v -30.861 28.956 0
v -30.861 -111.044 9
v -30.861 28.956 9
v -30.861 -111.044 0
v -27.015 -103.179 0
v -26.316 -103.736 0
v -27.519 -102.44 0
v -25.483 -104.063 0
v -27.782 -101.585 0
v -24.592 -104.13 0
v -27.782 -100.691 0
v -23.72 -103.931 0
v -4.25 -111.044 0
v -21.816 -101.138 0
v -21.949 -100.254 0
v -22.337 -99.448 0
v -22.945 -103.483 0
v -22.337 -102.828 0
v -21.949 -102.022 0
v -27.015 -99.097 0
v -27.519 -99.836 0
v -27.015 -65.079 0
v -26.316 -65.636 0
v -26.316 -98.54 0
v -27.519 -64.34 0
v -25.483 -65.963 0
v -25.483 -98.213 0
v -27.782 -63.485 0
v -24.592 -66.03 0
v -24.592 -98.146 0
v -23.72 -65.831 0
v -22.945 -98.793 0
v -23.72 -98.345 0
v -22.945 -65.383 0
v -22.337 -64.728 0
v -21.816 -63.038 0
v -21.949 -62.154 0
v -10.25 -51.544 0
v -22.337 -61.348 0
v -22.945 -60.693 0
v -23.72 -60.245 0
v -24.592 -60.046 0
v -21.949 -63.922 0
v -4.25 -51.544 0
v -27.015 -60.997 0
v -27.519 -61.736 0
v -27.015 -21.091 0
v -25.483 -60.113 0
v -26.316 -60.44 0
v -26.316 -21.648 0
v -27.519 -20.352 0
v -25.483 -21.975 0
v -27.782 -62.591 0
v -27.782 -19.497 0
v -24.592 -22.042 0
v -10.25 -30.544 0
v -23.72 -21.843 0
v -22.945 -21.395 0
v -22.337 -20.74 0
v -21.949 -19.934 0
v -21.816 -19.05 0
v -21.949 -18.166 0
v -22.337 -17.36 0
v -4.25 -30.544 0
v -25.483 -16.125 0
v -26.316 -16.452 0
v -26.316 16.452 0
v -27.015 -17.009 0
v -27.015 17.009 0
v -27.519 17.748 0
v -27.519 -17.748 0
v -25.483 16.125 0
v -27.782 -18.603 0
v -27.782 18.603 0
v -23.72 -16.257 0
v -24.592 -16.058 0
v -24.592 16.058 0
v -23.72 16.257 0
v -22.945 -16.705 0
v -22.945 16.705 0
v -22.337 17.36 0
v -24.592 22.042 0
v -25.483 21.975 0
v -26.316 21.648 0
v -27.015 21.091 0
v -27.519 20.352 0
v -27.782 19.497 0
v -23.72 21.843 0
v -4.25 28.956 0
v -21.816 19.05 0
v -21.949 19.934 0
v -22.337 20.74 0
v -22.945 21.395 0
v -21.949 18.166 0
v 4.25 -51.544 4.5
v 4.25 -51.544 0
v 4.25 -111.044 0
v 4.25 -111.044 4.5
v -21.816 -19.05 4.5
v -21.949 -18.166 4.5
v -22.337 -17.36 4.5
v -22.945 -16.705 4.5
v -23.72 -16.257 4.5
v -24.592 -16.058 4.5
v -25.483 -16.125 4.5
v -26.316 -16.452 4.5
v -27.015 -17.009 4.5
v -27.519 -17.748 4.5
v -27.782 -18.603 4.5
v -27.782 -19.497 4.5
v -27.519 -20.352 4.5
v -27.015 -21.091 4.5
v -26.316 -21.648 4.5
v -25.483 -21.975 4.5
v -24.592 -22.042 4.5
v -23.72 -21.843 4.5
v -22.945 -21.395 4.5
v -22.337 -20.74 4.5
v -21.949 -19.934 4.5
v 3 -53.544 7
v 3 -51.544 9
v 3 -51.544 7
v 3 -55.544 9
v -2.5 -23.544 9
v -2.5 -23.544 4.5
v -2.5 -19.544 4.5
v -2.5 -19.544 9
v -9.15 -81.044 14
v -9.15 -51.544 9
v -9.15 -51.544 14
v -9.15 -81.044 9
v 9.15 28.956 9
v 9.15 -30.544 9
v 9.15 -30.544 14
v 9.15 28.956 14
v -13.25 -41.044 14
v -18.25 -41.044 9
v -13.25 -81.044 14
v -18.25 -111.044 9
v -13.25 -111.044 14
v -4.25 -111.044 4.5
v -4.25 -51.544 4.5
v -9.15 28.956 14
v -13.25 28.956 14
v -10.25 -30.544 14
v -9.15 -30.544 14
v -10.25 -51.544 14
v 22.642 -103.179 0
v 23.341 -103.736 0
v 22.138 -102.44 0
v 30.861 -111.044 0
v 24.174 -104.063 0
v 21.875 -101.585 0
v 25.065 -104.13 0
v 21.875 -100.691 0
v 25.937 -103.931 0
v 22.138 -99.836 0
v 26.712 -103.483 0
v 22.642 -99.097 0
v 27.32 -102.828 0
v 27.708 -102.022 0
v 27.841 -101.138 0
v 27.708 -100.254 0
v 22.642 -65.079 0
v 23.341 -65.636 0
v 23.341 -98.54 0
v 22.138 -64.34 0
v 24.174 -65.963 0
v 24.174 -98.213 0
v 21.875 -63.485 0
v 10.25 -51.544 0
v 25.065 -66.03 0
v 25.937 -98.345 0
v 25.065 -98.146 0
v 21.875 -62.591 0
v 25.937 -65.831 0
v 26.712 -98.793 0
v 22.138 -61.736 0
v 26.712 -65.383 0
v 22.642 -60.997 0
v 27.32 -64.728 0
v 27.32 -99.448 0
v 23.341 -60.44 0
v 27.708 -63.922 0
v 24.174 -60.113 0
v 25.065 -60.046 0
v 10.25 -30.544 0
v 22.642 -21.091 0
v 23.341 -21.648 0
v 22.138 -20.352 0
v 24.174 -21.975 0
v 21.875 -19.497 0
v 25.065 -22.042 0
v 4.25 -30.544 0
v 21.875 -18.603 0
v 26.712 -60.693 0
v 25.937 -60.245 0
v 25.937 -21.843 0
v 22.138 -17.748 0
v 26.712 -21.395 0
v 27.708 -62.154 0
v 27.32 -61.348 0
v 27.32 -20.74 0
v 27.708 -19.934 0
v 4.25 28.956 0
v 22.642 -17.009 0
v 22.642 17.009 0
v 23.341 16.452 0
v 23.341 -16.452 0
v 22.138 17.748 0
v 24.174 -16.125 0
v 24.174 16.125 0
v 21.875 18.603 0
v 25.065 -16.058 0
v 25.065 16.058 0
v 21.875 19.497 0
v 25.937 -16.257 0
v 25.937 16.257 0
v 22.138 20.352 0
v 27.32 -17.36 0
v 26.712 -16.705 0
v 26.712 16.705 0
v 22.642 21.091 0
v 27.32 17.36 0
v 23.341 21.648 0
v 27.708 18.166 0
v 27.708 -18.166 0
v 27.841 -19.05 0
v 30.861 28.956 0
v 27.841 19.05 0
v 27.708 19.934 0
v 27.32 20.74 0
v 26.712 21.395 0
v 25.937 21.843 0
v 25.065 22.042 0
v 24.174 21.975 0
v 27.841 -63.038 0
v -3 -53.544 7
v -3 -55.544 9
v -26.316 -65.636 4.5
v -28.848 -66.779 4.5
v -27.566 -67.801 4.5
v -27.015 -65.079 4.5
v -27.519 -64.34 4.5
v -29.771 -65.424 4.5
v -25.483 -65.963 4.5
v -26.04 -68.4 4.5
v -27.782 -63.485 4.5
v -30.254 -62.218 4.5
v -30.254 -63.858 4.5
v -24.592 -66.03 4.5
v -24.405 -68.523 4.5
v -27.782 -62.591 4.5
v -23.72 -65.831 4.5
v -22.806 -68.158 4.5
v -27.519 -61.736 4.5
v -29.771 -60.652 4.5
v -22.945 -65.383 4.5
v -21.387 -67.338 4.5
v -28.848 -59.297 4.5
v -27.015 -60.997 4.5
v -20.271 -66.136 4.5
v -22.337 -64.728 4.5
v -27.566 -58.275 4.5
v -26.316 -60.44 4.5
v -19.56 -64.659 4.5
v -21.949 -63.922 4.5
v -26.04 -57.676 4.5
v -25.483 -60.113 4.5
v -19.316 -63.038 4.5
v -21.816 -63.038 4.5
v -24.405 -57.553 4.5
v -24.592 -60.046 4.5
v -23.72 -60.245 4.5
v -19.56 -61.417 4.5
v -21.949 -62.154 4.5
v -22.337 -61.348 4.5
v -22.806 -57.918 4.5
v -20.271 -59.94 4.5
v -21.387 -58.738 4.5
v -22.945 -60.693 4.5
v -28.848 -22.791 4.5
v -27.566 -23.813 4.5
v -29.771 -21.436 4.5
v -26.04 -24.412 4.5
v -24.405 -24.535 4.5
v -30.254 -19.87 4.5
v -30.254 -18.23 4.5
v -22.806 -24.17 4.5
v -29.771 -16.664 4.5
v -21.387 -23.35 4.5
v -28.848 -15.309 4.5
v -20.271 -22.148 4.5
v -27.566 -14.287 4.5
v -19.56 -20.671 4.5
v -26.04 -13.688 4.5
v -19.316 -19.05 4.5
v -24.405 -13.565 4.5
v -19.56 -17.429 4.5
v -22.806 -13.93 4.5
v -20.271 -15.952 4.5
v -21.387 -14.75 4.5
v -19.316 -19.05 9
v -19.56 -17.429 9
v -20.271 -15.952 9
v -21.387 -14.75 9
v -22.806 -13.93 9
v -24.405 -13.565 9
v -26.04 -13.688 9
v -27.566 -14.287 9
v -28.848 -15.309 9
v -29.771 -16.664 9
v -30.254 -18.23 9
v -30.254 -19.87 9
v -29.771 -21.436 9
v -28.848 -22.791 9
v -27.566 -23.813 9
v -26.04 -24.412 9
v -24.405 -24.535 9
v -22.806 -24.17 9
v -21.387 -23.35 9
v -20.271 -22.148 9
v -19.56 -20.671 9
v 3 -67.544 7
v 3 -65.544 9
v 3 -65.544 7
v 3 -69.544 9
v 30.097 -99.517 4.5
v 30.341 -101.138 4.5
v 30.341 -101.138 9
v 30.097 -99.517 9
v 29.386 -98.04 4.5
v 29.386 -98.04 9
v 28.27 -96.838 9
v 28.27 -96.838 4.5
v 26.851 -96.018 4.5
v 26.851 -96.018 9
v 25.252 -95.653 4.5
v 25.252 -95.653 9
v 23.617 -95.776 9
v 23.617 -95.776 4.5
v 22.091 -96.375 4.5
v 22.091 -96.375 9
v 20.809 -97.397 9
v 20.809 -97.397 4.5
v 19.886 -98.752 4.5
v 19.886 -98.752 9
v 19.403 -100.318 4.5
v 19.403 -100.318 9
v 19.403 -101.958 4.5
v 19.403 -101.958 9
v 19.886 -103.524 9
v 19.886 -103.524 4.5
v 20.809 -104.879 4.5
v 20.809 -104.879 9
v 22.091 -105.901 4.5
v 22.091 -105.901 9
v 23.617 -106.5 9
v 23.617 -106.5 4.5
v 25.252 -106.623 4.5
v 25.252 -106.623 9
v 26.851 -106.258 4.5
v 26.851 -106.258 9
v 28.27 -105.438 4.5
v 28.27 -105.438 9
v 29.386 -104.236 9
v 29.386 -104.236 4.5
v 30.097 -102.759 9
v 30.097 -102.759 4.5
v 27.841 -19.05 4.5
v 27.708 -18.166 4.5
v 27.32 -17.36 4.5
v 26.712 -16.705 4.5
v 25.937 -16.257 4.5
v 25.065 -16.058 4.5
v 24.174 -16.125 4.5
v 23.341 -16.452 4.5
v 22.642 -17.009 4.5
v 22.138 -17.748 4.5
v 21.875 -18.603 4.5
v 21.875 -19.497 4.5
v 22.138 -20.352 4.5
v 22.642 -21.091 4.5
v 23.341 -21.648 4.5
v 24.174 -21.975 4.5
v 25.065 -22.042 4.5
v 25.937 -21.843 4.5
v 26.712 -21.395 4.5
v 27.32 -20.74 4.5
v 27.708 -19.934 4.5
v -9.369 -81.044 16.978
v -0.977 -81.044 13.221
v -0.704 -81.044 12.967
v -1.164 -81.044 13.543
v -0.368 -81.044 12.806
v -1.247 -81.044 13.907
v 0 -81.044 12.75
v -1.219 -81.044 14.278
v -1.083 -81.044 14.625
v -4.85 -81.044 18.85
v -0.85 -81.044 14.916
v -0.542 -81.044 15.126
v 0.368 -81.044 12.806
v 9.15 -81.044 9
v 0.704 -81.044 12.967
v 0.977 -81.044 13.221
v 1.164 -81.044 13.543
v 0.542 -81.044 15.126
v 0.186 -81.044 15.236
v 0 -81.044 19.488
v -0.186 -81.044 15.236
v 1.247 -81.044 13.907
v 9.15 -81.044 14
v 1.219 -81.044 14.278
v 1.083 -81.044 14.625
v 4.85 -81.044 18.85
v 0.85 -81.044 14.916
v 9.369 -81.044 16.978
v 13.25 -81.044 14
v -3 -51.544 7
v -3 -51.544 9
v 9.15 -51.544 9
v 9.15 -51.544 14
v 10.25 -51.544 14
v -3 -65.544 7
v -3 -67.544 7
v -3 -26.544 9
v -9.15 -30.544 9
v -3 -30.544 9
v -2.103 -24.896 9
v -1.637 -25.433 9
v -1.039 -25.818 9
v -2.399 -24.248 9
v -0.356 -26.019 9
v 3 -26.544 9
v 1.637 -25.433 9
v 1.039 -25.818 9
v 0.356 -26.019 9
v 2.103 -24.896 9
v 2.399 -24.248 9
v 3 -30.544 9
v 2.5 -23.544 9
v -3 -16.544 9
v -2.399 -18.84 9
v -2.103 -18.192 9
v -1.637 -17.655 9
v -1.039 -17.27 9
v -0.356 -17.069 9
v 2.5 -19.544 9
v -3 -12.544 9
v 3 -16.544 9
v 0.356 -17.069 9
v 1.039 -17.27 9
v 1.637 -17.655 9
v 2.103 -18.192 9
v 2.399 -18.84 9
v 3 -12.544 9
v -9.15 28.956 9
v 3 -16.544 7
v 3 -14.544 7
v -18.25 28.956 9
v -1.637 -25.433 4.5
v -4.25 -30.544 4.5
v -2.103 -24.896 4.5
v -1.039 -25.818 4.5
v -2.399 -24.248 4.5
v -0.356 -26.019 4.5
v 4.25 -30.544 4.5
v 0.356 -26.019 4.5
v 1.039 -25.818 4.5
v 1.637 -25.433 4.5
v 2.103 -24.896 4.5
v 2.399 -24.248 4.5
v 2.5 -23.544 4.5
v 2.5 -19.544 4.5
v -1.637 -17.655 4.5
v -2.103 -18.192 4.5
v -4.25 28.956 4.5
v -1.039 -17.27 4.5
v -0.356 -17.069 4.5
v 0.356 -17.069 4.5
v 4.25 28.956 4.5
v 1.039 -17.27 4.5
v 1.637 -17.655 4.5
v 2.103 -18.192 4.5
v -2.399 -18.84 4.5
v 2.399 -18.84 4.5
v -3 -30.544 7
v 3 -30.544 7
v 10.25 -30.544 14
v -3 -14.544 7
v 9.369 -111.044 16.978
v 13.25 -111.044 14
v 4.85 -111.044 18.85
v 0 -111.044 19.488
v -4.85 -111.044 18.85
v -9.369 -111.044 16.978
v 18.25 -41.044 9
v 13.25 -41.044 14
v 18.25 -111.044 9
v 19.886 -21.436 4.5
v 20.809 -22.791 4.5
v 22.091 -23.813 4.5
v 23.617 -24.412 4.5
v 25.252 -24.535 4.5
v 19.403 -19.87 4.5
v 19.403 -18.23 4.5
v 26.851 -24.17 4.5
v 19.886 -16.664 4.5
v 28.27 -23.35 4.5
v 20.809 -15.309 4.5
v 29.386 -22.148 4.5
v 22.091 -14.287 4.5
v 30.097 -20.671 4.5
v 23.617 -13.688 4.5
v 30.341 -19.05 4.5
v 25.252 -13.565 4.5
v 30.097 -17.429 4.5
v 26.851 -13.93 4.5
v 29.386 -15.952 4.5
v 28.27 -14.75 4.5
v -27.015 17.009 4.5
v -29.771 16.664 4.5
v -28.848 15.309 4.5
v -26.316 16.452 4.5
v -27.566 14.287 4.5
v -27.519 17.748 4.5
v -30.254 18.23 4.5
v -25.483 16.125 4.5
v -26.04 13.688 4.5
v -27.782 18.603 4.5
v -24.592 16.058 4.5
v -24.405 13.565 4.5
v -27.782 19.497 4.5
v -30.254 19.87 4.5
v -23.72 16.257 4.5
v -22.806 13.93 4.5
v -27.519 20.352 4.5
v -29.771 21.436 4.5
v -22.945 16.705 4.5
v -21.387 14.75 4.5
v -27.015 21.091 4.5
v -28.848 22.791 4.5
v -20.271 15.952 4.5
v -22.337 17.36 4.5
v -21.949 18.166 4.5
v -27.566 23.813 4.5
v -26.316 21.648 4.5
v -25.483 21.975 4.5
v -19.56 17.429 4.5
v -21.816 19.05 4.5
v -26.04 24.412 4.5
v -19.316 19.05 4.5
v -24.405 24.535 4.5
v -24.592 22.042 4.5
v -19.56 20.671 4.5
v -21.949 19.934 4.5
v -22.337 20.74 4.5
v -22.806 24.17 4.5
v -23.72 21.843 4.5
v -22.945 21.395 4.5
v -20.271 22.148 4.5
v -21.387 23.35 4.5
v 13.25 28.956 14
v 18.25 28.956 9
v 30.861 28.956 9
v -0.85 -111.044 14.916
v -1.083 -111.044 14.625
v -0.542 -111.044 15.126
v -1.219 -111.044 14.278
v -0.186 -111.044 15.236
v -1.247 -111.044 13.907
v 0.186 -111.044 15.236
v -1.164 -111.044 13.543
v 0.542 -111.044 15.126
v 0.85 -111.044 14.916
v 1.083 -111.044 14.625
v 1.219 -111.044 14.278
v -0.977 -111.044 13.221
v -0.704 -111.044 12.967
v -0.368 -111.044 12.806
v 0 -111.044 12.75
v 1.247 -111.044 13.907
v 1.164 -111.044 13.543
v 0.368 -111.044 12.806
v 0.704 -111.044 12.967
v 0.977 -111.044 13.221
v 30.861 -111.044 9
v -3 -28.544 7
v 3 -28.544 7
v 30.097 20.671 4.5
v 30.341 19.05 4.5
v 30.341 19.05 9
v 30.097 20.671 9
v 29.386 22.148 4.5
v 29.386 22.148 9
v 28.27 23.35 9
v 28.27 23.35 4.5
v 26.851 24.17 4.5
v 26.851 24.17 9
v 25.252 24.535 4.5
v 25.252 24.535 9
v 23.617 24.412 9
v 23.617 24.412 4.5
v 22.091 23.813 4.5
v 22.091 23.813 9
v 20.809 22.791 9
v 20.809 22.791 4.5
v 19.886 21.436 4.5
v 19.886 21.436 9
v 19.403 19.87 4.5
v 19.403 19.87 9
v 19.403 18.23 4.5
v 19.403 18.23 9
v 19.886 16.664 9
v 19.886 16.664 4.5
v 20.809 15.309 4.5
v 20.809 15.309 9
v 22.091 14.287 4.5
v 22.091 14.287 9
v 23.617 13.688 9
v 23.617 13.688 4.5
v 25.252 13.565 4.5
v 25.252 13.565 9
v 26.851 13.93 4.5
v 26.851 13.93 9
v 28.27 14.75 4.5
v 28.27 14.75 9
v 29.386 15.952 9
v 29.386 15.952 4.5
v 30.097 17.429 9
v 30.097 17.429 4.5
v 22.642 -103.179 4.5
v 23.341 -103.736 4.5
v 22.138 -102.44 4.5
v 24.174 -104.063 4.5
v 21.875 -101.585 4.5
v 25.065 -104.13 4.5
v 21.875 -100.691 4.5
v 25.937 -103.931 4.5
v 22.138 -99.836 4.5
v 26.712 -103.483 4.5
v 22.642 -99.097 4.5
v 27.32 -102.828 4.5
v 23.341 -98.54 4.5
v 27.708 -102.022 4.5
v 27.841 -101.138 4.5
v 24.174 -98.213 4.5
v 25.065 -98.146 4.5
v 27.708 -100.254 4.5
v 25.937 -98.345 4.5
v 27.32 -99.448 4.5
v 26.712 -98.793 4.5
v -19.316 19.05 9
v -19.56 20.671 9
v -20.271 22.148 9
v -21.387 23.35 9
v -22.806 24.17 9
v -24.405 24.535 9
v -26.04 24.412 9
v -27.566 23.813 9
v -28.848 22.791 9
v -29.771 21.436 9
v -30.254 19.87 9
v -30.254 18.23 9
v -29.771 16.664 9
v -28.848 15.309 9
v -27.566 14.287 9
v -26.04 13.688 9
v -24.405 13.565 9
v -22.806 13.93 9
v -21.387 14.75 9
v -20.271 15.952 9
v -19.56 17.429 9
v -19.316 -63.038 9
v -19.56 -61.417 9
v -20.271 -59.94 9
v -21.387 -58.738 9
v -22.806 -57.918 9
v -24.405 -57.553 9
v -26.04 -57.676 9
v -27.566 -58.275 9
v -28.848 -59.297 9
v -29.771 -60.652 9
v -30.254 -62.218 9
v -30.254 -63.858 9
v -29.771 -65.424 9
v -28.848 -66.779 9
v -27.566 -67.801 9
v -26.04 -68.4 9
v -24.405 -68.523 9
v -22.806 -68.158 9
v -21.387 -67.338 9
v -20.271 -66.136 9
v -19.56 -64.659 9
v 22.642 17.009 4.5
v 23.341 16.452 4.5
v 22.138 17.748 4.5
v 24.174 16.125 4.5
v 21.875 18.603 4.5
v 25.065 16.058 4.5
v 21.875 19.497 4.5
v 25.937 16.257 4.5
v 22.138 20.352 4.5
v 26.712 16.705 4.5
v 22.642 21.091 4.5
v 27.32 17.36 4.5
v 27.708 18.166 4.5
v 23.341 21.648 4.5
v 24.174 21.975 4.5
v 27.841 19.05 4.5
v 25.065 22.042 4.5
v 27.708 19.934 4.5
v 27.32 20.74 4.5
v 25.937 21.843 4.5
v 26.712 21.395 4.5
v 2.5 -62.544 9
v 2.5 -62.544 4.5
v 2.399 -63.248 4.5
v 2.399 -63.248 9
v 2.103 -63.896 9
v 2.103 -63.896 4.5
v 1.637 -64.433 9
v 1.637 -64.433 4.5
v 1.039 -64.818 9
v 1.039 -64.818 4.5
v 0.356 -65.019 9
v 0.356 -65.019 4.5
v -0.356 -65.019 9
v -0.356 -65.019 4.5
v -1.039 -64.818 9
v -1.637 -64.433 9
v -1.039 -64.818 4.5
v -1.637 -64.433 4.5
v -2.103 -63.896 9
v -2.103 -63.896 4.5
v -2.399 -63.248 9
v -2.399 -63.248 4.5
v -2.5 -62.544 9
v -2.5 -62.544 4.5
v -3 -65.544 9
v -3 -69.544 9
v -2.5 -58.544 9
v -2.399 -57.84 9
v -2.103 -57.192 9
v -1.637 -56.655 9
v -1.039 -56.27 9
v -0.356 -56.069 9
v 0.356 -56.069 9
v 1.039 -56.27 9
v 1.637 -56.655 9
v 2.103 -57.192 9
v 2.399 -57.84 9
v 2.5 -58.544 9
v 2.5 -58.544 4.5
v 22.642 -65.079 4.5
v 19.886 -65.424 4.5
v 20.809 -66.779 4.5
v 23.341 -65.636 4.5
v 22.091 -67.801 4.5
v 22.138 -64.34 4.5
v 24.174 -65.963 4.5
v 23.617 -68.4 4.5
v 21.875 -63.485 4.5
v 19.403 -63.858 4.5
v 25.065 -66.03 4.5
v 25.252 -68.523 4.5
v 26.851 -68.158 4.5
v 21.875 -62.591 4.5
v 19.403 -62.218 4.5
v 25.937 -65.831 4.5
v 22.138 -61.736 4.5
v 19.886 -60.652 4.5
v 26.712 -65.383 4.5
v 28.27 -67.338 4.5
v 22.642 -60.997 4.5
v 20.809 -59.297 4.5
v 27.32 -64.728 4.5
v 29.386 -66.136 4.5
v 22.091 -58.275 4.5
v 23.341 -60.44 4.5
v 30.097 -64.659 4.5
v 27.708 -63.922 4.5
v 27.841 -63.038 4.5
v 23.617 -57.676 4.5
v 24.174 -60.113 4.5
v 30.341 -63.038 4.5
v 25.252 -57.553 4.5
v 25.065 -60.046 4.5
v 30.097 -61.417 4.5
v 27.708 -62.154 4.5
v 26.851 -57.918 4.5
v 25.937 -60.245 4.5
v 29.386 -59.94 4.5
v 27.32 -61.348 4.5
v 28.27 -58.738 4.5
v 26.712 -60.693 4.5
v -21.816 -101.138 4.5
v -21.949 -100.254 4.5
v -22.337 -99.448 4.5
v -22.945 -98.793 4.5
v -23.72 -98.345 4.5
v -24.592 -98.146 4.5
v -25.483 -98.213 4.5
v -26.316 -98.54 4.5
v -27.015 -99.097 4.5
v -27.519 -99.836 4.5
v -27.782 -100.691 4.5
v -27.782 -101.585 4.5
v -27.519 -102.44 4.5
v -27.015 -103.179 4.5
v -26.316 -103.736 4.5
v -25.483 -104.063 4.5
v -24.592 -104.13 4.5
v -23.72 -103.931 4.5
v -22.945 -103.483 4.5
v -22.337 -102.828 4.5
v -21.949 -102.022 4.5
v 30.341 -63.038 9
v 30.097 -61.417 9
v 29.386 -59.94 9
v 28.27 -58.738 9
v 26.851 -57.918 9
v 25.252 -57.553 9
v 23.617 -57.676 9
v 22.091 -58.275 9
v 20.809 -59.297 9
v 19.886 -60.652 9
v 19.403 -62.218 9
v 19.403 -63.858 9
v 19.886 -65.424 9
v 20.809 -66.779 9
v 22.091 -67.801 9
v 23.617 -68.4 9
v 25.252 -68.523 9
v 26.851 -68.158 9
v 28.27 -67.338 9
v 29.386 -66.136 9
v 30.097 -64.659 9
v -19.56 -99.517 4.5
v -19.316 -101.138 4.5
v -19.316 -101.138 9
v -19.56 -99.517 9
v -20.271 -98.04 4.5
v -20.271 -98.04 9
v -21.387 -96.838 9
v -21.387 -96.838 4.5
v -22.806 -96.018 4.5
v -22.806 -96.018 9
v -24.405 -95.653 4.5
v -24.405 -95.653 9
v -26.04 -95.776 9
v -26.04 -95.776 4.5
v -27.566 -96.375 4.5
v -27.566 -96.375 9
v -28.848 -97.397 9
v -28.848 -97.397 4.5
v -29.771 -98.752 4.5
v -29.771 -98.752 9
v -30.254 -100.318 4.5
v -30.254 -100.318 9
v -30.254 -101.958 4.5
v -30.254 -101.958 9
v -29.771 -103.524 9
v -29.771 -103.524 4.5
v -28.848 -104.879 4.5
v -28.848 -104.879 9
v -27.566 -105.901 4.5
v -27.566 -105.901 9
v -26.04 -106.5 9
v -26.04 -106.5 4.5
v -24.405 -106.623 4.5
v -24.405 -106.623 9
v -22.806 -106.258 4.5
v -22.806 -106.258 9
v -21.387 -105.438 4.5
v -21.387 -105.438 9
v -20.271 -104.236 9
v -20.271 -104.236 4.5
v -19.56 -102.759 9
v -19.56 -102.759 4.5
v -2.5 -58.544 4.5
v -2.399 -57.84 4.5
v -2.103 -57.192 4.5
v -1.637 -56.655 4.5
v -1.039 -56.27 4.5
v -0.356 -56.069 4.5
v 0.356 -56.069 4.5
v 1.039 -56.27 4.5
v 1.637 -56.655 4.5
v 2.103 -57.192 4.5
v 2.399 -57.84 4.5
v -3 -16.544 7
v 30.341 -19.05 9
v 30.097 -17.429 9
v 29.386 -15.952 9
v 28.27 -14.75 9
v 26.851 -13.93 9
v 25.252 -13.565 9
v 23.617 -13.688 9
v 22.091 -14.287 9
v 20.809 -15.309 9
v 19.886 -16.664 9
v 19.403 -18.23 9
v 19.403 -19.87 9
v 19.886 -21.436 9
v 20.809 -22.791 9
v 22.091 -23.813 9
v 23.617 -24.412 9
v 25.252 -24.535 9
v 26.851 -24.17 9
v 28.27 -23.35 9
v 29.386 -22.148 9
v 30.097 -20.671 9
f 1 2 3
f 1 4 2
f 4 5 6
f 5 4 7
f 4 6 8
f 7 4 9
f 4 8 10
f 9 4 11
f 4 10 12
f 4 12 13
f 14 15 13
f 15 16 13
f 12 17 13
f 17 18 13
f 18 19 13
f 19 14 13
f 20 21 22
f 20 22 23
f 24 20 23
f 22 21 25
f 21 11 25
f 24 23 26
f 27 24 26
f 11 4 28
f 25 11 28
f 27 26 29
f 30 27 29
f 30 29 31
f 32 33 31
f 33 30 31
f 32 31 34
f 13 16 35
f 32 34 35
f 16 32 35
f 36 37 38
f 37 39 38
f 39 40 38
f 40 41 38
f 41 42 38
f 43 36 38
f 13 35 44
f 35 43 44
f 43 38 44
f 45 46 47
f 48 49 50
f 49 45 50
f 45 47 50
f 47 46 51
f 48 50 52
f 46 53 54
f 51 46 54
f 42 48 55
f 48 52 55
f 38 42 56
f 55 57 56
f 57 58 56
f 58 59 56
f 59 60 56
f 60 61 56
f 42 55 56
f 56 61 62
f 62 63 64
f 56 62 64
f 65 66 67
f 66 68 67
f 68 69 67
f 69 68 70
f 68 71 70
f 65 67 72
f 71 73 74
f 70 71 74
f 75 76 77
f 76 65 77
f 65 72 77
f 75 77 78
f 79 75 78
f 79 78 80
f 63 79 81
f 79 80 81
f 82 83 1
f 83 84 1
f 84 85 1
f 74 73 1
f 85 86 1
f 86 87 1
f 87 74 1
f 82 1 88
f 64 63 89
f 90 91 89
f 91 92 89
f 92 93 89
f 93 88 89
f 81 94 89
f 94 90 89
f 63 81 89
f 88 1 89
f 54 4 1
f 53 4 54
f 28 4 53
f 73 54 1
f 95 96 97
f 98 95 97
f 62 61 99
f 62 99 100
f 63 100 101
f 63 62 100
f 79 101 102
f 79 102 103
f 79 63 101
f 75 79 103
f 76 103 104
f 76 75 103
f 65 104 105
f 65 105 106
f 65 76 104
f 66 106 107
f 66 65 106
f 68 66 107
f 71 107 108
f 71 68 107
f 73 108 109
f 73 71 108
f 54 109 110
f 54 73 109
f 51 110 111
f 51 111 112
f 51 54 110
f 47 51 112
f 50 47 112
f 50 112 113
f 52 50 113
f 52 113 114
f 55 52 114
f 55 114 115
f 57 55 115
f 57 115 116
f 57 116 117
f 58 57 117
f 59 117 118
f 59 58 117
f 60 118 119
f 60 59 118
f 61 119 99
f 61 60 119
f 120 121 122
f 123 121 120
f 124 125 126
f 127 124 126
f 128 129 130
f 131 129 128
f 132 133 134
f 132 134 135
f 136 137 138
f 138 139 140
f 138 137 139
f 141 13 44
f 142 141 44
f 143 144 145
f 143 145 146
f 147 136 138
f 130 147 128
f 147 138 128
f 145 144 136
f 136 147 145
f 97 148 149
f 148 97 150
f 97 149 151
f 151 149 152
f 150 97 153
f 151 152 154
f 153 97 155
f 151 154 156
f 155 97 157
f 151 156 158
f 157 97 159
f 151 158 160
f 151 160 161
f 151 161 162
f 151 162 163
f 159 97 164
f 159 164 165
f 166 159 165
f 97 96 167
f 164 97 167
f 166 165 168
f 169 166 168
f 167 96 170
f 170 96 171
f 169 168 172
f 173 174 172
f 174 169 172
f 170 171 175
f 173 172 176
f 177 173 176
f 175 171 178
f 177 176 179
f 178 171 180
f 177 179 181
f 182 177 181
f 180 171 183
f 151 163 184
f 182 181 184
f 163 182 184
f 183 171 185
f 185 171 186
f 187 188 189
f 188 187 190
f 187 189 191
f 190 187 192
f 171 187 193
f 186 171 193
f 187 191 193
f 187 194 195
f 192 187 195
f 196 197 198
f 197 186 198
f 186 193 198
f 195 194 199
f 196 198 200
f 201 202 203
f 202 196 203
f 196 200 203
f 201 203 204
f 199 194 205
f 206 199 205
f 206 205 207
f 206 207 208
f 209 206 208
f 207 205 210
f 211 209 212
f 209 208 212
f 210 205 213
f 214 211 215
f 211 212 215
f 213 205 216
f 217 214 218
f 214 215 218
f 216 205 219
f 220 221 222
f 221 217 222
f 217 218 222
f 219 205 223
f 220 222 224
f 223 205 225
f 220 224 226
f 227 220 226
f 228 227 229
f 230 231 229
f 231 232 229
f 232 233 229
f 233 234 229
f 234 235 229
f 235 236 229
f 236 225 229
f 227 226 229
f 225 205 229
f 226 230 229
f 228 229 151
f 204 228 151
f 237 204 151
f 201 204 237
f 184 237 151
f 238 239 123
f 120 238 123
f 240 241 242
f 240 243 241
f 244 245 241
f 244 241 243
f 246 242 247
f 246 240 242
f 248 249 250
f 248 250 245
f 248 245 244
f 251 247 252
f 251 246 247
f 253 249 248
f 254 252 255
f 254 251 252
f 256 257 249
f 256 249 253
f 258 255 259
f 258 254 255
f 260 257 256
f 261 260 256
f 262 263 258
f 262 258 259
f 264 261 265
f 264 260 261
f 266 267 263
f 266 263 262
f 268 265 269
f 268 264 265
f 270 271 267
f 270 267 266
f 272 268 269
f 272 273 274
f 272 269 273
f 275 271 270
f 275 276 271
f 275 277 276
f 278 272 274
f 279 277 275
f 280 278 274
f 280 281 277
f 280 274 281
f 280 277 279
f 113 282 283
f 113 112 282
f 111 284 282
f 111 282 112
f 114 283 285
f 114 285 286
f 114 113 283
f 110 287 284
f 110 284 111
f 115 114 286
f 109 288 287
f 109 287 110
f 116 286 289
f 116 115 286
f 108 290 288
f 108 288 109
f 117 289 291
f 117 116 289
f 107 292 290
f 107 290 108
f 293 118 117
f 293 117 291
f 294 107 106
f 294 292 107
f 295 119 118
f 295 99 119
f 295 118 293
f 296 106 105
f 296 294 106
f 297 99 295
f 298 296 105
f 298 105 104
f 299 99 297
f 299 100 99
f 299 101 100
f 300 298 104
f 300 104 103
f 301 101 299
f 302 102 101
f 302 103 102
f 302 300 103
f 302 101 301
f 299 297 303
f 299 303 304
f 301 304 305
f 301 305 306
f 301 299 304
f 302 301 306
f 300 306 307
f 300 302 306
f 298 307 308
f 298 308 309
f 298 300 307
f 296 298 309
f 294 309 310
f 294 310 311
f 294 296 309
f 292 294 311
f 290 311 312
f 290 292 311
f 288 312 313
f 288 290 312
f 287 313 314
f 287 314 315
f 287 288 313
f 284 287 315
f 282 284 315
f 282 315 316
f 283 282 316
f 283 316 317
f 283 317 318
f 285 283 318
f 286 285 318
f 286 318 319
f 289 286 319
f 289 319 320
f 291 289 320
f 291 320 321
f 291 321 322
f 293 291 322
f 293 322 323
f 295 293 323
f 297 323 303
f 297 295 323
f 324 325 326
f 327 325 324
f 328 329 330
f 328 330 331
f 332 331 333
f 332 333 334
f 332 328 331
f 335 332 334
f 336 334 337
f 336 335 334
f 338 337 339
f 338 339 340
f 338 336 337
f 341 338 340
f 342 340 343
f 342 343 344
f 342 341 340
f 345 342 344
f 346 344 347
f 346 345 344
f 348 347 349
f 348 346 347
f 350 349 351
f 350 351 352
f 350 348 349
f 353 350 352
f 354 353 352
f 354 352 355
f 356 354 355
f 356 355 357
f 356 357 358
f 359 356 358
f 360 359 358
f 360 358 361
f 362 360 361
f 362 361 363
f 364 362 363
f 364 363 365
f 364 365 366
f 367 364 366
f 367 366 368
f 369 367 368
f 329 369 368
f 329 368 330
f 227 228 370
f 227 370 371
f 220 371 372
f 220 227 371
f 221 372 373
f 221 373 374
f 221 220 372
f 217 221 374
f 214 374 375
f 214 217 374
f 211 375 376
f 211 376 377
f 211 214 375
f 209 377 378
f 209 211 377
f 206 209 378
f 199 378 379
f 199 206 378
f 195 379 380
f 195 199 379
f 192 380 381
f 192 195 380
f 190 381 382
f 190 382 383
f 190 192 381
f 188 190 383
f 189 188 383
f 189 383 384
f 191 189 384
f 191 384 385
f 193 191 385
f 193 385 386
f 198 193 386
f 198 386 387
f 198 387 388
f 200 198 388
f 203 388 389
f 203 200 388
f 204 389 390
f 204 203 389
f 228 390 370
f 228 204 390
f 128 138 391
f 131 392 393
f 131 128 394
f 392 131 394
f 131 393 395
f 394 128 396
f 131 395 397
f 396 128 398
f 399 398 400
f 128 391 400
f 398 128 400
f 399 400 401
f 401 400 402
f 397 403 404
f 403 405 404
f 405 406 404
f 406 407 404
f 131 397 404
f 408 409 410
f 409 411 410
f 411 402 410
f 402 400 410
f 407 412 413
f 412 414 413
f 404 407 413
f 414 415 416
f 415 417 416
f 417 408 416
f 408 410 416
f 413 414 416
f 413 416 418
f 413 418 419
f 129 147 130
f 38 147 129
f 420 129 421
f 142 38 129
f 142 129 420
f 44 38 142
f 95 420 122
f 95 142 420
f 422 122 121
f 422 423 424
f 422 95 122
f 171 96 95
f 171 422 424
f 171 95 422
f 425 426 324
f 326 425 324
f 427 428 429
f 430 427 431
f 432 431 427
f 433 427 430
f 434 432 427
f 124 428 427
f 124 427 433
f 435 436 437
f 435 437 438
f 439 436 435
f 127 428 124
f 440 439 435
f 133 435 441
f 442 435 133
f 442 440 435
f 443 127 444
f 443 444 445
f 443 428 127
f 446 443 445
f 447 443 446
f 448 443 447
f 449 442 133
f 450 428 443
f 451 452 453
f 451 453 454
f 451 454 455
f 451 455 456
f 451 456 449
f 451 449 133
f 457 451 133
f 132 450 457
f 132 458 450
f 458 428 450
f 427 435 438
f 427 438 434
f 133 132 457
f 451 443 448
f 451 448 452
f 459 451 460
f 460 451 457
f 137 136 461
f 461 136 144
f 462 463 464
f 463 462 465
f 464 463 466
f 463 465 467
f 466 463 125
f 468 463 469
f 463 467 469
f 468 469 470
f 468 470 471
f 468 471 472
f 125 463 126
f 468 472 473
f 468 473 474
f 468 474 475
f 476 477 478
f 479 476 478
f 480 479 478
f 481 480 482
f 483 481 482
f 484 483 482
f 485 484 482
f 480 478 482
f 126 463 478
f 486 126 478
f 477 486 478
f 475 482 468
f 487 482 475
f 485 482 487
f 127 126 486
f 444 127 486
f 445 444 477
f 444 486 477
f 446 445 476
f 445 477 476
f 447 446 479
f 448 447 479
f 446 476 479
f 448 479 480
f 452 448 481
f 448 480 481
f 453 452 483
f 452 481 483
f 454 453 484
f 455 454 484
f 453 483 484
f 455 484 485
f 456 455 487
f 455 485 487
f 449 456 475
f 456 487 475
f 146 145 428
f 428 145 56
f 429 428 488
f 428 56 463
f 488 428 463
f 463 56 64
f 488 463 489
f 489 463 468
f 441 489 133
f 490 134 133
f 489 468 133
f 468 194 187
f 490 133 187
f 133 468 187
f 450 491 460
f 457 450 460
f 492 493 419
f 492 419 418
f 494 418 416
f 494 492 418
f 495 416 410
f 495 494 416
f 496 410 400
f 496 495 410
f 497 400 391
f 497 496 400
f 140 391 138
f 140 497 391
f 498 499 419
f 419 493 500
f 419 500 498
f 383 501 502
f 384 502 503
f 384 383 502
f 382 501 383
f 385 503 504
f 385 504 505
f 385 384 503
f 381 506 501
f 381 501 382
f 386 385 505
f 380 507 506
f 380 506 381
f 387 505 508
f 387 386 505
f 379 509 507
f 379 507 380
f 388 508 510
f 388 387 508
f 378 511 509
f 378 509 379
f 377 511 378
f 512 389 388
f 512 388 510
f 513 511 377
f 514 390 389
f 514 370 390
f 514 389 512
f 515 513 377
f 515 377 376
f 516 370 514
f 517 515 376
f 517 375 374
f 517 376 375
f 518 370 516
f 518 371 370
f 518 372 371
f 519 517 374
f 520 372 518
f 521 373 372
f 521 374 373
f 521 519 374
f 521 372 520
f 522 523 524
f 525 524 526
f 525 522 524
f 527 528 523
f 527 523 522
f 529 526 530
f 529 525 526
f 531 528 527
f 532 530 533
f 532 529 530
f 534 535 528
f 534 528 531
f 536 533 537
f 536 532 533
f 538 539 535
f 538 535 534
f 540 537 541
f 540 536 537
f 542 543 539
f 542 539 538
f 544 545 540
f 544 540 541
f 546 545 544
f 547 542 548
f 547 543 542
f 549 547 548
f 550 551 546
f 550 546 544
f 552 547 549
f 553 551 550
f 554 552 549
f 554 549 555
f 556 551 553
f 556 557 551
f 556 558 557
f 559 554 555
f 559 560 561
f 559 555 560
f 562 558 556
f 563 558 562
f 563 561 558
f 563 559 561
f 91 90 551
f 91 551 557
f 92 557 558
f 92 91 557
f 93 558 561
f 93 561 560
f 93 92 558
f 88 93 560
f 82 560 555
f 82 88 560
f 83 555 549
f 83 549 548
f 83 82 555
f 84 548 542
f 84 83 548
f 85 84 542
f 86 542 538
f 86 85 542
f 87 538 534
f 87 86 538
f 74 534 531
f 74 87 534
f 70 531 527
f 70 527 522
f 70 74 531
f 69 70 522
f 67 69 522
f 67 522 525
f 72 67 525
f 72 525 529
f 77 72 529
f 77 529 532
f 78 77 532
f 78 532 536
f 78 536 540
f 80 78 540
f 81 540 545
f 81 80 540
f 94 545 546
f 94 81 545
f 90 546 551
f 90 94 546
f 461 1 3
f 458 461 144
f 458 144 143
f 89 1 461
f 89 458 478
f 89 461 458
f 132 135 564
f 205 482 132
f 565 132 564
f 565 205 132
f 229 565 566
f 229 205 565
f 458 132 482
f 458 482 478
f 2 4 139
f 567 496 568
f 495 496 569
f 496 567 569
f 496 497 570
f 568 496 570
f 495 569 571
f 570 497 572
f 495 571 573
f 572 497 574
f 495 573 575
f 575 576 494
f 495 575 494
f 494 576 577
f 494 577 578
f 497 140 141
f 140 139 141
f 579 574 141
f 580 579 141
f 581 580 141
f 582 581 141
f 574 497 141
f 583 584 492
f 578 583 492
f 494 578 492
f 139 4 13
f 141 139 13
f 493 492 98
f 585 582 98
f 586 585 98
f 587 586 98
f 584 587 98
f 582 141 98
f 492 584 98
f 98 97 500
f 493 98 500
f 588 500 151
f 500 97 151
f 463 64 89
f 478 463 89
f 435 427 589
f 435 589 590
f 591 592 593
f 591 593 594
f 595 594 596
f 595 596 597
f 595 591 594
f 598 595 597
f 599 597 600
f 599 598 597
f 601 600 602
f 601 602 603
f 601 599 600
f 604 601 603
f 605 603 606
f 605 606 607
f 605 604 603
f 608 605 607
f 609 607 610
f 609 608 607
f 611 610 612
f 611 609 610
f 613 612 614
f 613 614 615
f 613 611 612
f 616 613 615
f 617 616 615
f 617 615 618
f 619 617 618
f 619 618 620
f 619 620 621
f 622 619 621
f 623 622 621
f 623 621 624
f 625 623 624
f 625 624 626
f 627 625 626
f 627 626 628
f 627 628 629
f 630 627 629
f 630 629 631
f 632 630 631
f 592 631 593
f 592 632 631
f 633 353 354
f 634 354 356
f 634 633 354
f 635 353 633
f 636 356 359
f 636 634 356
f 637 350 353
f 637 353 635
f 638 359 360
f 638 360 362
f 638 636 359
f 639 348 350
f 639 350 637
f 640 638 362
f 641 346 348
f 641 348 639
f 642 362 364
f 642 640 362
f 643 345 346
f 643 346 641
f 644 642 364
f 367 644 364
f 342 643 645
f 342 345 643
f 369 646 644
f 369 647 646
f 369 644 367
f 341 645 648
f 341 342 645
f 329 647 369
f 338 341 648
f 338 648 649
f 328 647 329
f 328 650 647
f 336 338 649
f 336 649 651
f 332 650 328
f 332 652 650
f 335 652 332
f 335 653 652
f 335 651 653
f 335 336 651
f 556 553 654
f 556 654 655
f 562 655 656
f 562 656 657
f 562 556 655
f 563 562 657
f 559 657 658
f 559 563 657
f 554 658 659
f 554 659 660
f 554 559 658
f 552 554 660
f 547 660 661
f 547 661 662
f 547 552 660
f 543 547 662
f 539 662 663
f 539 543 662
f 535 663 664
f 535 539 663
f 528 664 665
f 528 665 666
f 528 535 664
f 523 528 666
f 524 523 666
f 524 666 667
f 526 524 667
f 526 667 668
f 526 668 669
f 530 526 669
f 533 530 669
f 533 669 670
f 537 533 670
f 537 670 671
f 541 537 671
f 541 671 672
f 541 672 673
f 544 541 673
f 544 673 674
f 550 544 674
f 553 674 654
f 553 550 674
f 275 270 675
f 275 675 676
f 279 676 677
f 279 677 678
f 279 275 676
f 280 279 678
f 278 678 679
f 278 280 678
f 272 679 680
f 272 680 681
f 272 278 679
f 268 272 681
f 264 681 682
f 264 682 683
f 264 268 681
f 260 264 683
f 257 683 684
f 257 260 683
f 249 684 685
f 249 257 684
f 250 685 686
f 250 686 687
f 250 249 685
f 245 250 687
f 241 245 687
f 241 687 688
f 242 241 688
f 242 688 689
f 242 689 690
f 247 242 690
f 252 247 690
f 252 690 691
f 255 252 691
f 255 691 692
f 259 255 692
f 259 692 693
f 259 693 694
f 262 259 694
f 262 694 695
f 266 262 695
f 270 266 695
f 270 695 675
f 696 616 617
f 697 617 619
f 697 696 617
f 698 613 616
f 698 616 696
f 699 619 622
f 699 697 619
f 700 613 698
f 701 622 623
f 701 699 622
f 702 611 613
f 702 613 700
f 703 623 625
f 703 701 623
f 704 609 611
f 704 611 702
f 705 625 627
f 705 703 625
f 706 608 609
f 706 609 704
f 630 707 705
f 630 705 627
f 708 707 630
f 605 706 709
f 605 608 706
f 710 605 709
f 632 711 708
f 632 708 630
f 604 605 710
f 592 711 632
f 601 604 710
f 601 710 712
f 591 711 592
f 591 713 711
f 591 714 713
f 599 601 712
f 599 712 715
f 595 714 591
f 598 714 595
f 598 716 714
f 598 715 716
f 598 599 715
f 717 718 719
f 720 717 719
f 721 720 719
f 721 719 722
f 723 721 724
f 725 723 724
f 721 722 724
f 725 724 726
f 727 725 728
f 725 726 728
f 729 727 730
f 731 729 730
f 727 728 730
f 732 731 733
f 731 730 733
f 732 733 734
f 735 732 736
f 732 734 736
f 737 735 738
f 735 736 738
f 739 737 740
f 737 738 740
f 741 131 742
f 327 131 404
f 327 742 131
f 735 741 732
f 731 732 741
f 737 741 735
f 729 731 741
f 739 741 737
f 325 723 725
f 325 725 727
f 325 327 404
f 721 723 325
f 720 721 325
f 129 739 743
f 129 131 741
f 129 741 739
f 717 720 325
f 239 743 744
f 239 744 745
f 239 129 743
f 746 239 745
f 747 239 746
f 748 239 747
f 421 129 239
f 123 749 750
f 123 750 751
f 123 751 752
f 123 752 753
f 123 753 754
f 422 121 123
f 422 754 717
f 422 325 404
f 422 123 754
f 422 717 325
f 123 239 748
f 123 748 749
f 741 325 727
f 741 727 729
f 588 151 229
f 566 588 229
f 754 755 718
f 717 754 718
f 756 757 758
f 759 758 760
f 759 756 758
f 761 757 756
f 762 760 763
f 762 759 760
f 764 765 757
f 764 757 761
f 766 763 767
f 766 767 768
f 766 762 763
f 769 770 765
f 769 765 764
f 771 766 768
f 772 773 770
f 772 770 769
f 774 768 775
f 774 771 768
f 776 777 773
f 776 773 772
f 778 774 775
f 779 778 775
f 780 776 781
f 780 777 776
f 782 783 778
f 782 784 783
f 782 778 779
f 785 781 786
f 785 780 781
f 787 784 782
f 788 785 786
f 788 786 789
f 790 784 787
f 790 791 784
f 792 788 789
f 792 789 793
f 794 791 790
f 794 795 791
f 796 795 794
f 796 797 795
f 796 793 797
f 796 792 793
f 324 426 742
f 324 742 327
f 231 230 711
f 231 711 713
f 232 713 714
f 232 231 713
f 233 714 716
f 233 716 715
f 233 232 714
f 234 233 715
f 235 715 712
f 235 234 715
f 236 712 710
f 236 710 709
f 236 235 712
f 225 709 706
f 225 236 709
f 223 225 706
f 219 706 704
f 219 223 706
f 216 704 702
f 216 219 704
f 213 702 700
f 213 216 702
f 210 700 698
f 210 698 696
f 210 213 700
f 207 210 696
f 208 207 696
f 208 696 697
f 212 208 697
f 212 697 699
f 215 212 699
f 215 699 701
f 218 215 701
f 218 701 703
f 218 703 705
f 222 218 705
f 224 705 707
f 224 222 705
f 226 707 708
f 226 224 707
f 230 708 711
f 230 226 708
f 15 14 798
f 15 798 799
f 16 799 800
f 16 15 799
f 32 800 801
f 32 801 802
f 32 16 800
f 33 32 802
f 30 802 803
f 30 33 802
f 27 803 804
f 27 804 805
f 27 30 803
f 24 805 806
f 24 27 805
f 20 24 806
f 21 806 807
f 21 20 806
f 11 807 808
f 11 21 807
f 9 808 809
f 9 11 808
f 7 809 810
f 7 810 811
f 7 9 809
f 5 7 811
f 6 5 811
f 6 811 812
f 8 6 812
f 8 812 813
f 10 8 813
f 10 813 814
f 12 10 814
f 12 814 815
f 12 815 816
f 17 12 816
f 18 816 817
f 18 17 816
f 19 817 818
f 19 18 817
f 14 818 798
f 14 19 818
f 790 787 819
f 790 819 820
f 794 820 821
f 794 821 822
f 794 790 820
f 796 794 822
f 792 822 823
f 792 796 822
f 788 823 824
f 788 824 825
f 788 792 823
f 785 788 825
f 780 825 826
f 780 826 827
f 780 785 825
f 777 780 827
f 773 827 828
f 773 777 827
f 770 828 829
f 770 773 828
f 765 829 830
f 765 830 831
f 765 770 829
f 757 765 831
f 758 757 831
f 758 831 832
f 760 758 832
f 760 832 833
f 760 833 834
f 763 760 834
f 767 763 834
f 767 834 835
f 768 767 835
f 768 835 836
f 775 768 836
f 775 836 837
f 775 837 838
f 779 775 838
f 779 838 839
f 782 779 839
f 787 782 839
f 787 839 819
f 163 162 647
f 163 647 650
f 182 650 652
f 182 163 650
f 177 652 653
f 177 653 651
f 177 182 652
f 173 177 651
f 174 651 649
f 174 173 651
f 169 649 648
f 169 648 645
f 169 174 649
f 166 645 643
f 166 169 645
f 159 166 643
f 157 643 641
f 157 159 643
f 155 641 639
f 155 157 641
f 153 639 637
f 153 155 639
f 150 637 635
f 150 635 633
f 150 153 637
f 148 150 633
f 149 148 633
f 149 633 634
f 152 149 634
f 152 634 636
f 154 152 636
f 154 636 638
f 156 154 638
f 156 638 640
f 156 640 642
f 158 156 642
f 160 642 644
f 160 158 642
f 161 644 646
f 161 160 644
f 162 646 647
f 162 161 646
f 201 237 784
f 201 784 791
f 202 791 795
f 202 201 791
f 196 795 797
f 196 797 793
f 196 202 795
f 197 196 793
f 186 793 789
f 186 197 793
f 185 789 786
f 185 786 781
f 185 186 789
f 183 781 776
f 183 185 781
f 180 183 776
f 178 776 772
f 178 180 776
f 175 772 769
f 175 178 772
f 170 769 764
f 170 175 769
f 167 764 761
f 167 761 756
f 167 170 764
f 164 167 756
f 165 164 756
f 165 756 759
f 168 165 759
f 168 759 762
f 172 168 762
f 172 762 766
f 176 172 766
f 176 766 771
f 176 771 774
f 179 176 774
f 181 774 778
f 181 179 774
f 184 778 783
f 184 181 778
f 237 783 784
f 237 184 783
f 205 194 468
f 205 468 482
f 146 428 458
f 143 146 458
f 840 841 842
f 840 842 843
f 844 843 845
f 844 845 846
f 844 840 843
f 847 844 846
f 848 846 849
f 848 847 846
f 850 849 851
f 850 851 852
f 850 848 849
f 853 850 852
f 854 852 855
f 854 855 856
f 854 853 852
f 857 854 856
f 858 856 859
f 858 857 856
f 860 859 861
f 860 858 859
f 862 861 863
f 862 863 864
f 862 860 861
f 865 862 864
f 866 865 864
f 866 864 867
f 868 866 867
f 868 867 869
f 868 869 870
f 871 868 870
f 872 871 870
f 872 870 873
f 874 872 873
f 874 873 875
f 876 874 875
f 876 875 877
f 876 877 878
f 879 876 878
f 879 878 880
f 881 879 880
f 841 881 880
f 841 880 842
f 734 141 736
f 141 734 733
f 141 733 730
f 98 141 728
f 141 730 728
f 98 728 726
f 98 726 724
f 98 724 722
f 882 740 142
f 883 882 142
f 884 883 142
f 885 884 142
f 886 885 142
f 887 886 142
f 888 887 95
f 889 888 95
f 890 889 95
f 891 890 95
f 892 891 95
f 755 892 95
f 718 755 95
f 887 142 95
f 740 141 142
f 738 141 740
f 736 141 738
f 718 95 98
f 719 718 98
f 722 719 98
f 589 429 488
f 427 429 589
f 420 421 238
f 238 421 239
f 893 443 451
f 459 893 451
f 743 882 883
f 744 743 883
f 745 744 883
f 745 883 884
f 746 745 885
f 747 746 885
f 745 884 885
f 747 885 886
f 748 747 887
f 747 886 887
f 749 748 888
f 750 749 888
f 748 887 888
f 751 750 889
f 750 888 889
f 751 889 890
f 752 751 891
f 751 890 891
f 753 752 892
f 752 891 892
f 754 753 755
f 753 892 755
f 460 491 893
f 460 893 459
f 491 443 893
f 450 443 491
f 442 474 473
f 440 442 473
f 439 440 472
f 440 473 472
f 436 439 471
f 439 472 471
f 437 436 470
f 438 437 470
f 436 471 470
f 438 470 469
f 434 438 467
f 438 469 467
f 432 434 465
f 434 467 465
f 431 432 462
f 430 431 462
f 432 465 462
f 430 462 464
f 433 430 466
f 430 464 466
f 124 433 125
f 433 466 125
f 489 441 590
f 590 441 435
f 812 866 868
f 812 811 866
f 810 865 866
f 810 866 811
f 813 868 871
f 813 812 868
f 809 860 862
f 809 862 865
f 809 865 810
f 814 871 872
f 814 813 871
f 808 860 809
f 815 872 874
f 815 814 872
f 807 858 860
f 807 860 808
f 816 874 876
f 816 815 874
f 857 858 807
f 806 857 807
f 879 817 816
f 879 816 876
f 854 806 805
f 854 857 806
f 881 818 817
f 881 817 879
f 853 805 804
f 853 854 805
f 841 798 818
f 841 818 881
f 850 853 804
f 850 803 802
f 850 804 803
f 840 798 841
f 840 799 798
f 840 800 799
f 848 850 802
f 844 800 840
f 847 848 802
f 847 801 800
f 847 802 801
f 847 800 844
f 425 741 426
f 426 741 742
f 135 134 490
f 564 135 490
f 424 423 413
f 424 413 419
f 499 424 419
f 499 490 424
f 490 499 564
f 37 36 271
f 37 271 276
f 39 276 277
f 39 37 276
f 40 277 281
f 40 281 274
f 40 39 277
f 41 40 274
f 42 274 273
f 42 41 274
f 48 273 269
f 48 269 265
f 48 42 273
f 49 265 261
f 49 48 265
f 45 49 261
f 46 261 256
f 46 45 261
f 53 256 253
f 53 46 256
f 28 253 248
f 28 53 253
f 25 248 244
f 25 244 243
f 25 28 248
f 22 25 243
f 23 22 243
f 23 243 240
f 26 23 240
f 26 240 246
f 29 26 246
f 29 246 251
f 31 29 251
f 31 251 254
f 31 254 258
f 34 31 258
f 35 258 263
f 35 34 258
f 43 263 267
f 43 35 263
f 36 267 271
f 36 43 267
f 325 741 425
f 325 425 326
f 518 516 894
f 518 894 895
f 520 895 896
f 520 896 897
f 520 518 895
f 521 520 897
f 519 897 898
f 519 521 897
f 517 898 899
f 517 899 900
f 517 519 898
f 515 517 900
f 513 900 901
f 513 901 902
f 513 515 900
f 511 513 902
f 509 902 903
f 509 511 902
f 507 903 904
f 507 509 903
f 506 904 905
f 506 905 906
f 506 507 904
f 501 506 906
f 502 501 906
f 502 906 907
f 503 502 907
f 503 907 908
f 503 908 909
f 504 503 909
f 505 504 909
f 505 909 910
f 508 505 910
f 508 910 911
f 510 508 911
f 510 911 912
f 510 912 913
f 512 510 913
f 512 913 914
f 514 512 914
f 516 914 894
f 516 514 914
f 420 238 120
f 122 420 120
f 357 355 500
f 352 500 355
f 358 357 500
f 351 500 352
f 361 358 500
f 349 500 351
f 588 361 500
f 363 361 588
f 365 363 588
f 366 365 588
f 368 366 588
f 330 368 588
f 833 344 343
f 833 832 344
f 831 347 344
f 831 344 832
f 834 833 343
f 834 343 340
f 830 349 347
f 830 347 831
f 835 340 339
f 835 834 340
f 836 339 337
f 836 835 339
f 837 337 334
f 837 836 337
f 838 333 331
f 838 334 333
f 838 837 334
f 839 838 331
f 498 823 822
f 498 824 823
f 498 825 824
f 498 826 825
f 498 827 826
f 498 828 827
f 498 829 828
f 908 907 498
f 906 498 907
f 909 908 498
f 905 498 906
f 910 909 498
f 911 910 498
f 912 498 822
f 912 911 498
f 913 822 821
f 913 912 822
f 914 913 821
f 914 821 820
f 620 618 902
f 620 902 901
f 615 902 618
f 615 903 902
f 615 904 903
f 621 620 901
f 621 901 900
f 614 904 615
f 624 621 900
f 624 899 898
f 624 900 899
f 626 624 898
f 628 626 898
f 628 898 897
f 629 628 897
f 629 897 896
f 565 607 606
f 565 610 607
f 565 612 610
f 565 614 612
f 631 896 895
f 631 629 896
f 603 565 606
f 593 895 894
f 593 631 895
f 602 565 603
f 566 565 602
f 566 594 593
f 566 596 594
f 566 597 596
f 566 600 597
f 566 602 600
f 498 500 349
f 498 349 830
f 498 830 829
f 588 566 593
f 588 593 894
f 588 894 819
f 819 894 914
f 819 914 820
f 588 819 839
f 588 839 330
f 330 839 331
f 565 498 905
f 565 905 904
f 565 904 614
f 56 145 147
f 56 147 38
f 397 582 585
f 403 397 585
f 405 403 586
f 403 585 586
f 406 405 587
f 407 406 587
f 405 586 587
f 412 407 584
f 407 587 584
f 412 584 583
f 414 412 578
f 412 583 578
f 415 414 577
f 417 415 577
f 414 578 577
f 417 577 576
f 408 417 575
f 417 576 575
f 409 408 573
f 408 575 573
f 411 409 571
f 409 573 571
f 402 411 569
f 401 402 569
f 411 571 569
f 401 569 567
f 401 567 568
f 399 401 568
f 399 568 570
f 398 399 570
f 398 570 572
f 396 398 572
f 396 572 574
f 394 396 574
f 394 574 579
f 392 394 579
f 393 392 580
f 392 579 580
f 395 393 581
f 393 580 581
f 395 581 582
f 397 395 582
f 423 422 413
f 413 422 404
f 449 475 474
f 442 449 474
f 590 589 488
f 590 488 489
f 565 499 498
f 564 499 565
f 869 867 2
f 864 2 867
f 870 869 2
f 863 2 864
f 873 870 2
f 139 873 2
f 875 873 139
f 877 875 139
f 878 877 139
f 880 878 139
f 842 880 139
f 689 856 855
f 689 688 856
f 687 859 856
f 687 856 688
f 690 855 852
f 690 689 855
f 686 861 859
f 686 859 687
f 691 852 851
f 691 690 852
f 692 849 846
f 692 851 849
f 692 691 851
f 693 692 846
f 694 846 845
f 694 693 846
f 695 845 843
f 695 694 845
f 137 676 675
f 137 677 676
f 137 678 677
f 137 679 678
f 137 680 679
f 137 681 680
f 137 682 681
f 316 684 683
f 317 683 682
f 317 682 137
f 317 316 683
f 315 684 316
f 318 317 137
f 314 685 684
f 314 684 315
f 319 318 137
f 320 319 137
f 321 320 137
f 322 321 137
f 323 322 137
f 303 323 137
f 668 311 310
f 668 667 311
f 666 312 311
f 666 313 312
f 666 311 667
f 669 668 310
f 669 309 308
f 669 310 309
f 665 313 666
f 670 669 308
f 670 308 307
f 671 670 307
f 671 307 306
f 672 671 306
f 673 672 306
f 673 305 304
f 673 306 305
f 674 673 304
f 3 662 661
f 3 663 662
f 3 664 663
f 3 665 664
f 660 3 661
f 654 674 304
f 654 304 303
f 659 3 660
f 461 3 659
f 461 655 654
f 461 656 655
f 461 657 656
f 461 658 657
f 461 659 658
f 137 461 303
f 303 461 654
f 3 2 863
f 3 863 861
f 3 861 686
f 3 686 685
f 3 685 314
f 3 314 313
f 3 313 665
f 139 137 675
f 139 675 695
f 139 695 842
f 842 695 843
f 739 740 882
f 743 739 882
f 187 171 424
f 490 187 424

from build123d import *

# Parameters (mm, degrees)
SKETCH1_W                = 26.611
SKETCH1_H                = 70
SKETCH1_R                = 3
BOSS_EXTRUDE1_DEPTH      = 4.5
BOSS_EXTRUDE1_2_DEPTH    = 4.5
SKETCH2_W                = 61.722
SKETCH2_H                = 70
SKETCH2_R                = 5.5
BOSS_EXTRUDE2_DEPTH      = 4.5
SKETCH3_W                = 3
SKETCH3_H                = 70
BOSS_EXTRUDE3_DEPTH      = 5
CHAMFER1_SIZE            = 5
CUT_EXTRUDE1_DEPTH       = 53.134549552
CUT_EXTRUDE1_DEPTH_BACK  = 53.134549552
SKETCH4_W                = 20.5
SKETCH4_H                = 10.5
MIRROR1_OUTLINE_R        = 5.5
MIRROR1_DEPTH            = 9
MIRROR1_START            = 4.5
MIRROR1_2_OUTLINE_W      = 8.5
MIRROR1_2_OUTLINE_H      = 59.5
MIRROR1_2_DEPTH          = 4.5
MIRROR1_3_OUTLINE_R      = 5.5
MIRROR1_3_OUTLINE_R_2    = 3
MIRROR1_3_DEPTH          = 4.5
MIRROR1_START_2          = -111.044
MIRROR1_4_DEPTH          = 70
SKETCH5_R                = 1.25
BOSS_EXTRUDE4_DEPTH      = 30
SKETCH6_W                = 1.1
SKETCH6_H                = 59.5
BOSS_EXTRUDE5_DEPTH      = 5
SKETCH7_W                = 6
SKETCH7_H                = 4
CUT_EXTRUDE2_DEPTH       = 2
CHAMFER2_SIZE            = 2
CHAMFER3_SIZE            = 2
CHAMFER2_OF_MIRROR2_SIZE = 2
CHAMFER3_OF_MIRROR2_SIZE = 2


with BuildPart() as part:
    # Sketch1 → Boss-Extrude1 (new body)
    with BuildSketch(Plane.XY):
        with Locations((17.5555, -6.044)):
            Rectangle(SKETCH1_W, SKETCH1_H)
        with Locations((24.8412, 19.05)):
            Circle(SKETCH1_R, mode=Mode.SUBTRACT)
        with Locations((24.8412, -19.05)):
            Circle(SKETCH1_R, mode=Mode.SUBTRACT)
    extrude(amount=BOSS_EXTRUDE1_DEPTH)



with BuildPart() as body_2:
    # Sketch1 → Boss-Extrude1 2 (new body)
    with BuildSketch(Plane.XY):
        with Locations((-17.5555, -6.044)):
            Rectangle(SKETCH1_W, SKETCH1_H)
        with Locations((-24.8158, -19.05)):
            Circle(SKETCH1_R, mode=Mode.SUBTRACT)
        with Locations((-24.8158, 19.05)):
            Circle(SKETCH1_R, mode=Mode.SUBTRACT)
    extrude(amount=BOSS_EXTRUDE1_2_DEPTH)


with BuildPart() as part_1:
    add(part.part)

    add(body_2.part)  # Boss-Extrude2 merges body 2
    # Sketch2 → Boss-Extrude2 (add)
    with BuildSketch(Plane.XY.offset(4.5)):
        with Locations((0, -6.044)):
            Rectangle(SKETCH2_W, SKETCH2_H)
        with Locations((24.8412, -19.05)):
            Circle(SKETCH2_R, mode=Mode.SUBTRACT)
        with Locations((-24.8158, -19.05)):
            Circle(SKETCH2_R, mode=Mode.SUBTRACT)
        with Locations((-24.8158, 19.05)):
            Circle(SKETCH2_R, mode=Mode.SUBTRACT)
        with Locations((24.8412, 19.05)):
            Circle(SKETCH2_R, mode=Mode.SUBTRACT)
    extrude(amount=BOSS_EXTRUDE2_DEPTH)

    # Sketch3 → Boss-Extrude3 (add)
    with BuildSketch(Plane.XY.offset(9)):
        with Locations((11.75, -6.044)):
            Rectangle(SKETCH3_W, SKETCH3_H)
        with Locations((-11.75, -6.044)):
            Rectangle(SKETCH3_W, SKETCH3_H)
    extrude(amount=BOSS_EXTRUDE3_DEPTH)

    # Chamfer1
    chamfer1_edges = [part_1.edges().sort_by_distance(p)[0] for p in [
        (-13.25, -6.044, 9),
        (13.25, -6.044, 9),
    ]]
    chamfer(chamfer1_edges, length=CHAMFER1_SIZE - 0.0001)  # a hair under: the kernel refuses the full size

    # Sketch4 → Cut-Extrude1 (cut, two sides: drawn at the far end of the back side and taken through both)
    with BuildSketch(Plane.XY.offset(9).offset(-CUT_EXTRUDE1_DEPTH_BACK)):
        with Locations((0, -35.794)):
            Rectangle(SKETCH4_W, SKETCH4_H)
        with BuildLine():
            Line((-2.5, -23.544), (-2.5, -19.544))
            ThreePointArc((-2.5, -19.544), (0, -17.044), (2.5, -19.544))
            Line((2.5, -19.544), (2.5, -23.544))
            ThreePointArc((2.5, -23.544), (0, -26.044), (-2.5, -23.544))
        make_face()
    extrude(amount=CUT_EXTRUDE1_DEPTH + CUT_EXTRUDE1_DEPTH_BACK, mode=Mode.SUBTRACT)

    # Mirror1: read off the stored shape, not the designer's step
    # Mirror1 outline → Mirror1 (add)
    # profile 1 of 2: a face of its own
    with BuildSketch(Plane.XY):
        Polygon((30.861, -111.044), (30.861, -41.044), (10.25, -41.044), (10.25, -51.544), (4.25, -51.544), (4.25, -111.044), align=None)
        with Locations((24.8412, -101.138)):
            Circle(MIRROR1_OUTLINE_R, mode=Mode.SUBTRACT)
        with Locations((24.8412, -63.038)):
            Circle(MIRROR1_OUTLINE_R, mode=Mode.SUBTRACT)
    # profile 2 of 2: a face of its own
    with BuildSketch(Plane.XY):
        Polygon((-4.25, -111.044), (-4.25, -51.544), (-10.25, -51.544), (-10.25, -41.044), (-30.861, -41.044), (-30.861, -111.044), align=None)
        with Locations((-24.8158, -63.038)):
            Circle(MIRROR1_OUTLINE_R, mode=Mode.SUBTRACT)
        with Locations((-24.8158, -101.138)):
            Circle(MIRROR1_OUTLINE_R, mode=Mode.SUBTRACT)
    extrude(amount=MIRROR1_DEPTH)

    # Mirror1 2 outline → Mirror1 2 (add)
    with BuildSketch(Plane.XY.offset(MIRROR1_START)):
        with Locations((0, -81.294)):
            Rectangle(MIRROR1_2_OUTLINE_W, MIRROR1_2_OUTLINE_H)
        with BuildLine():
            Line((-2.5, -62.544), (-2.5, -58.544))
            ThreePointArc((-2.5, -58.544), (0, -56.044), (2.5, -58.544))
            Line((2.5, -58.544), (2.5, -62.544))
            ThreePointArc((2.5, -62.544), (0, -65.044), (-2.5, -62.544))
        make_face(mode=Mode.SUBTRACT)
    extrude(amount=MIRROR1_2_DEPTH)

    # Mirror1 3 outline → Mirror1 3 (add)
    # profile 1 of 4: a face of its own
    with BuildSketch(Plane.XY):
        with Locations((24.8412, -63.038)):
            Circle(MIRROR1_3_OUTLINE_R)
        with Locations((24.8412, -63.038)):
            Circle(MIRROR1_3_OUTLINE_R_2, mode=Mode.SUBTRACT)
    # profile 2 of 4: a face of its own
    with BuildSketch(Plane.XY):
        with Locations((-24.8158, -63.038)):
            Circle(MIRROR1_3_OUTLINE_R)
        with Locations((-24.8158, -63.038)):
            Circle(MIRROR1_3_OUTLINE_R_2, mode=Mode.SUBTRACT)
    # profile 3 of 4: a face of its own
    with BuildSketch(Plane.XY):
        with Locations((-24.8158, -101.138)):
            Circle(MIRROR1_3_OUTLINE_R)
        with Locations((-24.8158, -101.138)):
            Circle(MIRROR1_3_OUTLINE_R_2, mode=Mode.SUBTRACT)
    # profile 4 of 4: a face of its own
    with BuildSketch(Plane.XY):
        with Locations((24.8412, -101.138)):
            Circle(MIRROR1_3_OUTLINE_R)
        with Locations((24.8412, -101.138)):
            Circle(MIRROR1_3_OUTLINE_R_2, mode=Mode.SUBTRACT)
    extrude(amount=MIRROR1_3_DEPTH)

    # Mirror1 4 outline → Mirror1 4 (add)
    with BuildSketch(Plane(origin=(0, 0, 0), x_dir=(1, 0, 0), z_dir=(0, 1, 0)).offset(MIRROR1_START_2)):
        Polygon((-10.25, -14), (-10.25, -9), (-18.25, -9), (-13.25, -14), align=None)
        Polygon((10.25, -9), (10.25, -14), (13.25, -14), (18.25, -9), align=None)
    extrude(amount=MIRROR1_4_DEPTH)

    # Sketch5 → Boss-Extrude4 (add)
    with BuildSketch(Plane.XZ.offset(111.044)):
        with BuildLine():
            Line((-13.25, 14), (-13.25, 9))
            Line((-13.25, 9), (13.25, 9))
            Line((13.25, 9), (13.25, 14))
            ThreePointArc((13.25, 14), (0, 19.488329701), (-13.25, 14))
        make_face()
        with Locations(Location((0, 14, 0), (0, 0, 270))):
            Circle(SKETCH5_R, mode=Mode.SUBTRACT)
    extrude(amount=-BOSS_EXTRUDE4_DEPTH)

    # Sketch6 → Boss-Extrude5 (add)
    with BuildSketch(Plane.XY.offset(9)):
        with Locations((-9.7, -0.794)):
            Rectangle(SKETCH6_W, SKETCH6_H)
        with Locations((9.7, -0.794)):
            Rectangle(SKETCH6_W, SKETCH6_H)
    boss_extrude5 = extrude(amount=BOSS_EXTRUDE5_DEPTH)

    # Sketch7 → Cut-Extrude2 (cut)
    with BuildSketch(Plane.XY.offset(9)):
        with Locations((0, -14.544)):
            Rectangle(SKETCH7_W, SKETCH7_H)
        with Locations((0, -28.544)):
            Rectangle(SKETCH7_W, SKETCH7_H)
    cut_extrude2 = extrude(amount=-CUT_EXTRUDE2_DEPTH, mode=Mode.SUBTRACT)

    # Chamfer2
    chamfer2_edges = [part_1.edges().sort_by_distance(p)[0] for p in [
        (0, -26.544, 7),
    ]]
    chamfer(chamfer2_edges, length=CHAMFER2_SIZE - 0.0001)  # a hair under: the kernel refuses the full size

    # Chamfer3
    chamfer3_edges = [part_1.edges().sort_by_distance(p)[0] for p in [
        (0, -12.544, 7),
    ]]
    chamfer(chamfer3_edges, length=CHAMFER3_SIZE - 0.0001)  # a hair under: the kernel refuses the full size

    # Mirror2: Boss-Extrude5, Cut-Extrude2 across plane
    add(boss_extrude5.mirror(Plane(origin=(0, -41.044, 0), x_dir=(0, 0, 1), z_dir=(0, -1, 0))))
    add(cut_extrude2.mirror(Plane(origin=(0, -41.044, 0), x_dir=(0, 0, 1), z_dir=(0, -1, 0))), mode=Mode.SUBTRACT)

    # Chamfer2 of Mirror2
    chamfer2_of_mirror2_edges = [part_1.edges().sort_by_distance(p)[0] for p in [
        (0, -55.544, 7),
    ]]
    chamfer(chamfer2_of_mirror2_edges, length=CHAMFER2_OF_MIRROR2_SIZE - 0.0001)  # a hair under: the kernel refuses the full size

    # Chamfer3 of Mirror2
    chamfer3_of_mirror2_edges = [part_1.edges().sort_by_distance(p)[0] for p in [
        (0, -69.544, 7),
    ]]
    chamfer(chamfer3_of_mirror2_edges, length=CHAMFER3_OF_MIRROR2_SIZE - 0.0001)  # a hair under: the kernel refuses the full size


solid = part_1.part
